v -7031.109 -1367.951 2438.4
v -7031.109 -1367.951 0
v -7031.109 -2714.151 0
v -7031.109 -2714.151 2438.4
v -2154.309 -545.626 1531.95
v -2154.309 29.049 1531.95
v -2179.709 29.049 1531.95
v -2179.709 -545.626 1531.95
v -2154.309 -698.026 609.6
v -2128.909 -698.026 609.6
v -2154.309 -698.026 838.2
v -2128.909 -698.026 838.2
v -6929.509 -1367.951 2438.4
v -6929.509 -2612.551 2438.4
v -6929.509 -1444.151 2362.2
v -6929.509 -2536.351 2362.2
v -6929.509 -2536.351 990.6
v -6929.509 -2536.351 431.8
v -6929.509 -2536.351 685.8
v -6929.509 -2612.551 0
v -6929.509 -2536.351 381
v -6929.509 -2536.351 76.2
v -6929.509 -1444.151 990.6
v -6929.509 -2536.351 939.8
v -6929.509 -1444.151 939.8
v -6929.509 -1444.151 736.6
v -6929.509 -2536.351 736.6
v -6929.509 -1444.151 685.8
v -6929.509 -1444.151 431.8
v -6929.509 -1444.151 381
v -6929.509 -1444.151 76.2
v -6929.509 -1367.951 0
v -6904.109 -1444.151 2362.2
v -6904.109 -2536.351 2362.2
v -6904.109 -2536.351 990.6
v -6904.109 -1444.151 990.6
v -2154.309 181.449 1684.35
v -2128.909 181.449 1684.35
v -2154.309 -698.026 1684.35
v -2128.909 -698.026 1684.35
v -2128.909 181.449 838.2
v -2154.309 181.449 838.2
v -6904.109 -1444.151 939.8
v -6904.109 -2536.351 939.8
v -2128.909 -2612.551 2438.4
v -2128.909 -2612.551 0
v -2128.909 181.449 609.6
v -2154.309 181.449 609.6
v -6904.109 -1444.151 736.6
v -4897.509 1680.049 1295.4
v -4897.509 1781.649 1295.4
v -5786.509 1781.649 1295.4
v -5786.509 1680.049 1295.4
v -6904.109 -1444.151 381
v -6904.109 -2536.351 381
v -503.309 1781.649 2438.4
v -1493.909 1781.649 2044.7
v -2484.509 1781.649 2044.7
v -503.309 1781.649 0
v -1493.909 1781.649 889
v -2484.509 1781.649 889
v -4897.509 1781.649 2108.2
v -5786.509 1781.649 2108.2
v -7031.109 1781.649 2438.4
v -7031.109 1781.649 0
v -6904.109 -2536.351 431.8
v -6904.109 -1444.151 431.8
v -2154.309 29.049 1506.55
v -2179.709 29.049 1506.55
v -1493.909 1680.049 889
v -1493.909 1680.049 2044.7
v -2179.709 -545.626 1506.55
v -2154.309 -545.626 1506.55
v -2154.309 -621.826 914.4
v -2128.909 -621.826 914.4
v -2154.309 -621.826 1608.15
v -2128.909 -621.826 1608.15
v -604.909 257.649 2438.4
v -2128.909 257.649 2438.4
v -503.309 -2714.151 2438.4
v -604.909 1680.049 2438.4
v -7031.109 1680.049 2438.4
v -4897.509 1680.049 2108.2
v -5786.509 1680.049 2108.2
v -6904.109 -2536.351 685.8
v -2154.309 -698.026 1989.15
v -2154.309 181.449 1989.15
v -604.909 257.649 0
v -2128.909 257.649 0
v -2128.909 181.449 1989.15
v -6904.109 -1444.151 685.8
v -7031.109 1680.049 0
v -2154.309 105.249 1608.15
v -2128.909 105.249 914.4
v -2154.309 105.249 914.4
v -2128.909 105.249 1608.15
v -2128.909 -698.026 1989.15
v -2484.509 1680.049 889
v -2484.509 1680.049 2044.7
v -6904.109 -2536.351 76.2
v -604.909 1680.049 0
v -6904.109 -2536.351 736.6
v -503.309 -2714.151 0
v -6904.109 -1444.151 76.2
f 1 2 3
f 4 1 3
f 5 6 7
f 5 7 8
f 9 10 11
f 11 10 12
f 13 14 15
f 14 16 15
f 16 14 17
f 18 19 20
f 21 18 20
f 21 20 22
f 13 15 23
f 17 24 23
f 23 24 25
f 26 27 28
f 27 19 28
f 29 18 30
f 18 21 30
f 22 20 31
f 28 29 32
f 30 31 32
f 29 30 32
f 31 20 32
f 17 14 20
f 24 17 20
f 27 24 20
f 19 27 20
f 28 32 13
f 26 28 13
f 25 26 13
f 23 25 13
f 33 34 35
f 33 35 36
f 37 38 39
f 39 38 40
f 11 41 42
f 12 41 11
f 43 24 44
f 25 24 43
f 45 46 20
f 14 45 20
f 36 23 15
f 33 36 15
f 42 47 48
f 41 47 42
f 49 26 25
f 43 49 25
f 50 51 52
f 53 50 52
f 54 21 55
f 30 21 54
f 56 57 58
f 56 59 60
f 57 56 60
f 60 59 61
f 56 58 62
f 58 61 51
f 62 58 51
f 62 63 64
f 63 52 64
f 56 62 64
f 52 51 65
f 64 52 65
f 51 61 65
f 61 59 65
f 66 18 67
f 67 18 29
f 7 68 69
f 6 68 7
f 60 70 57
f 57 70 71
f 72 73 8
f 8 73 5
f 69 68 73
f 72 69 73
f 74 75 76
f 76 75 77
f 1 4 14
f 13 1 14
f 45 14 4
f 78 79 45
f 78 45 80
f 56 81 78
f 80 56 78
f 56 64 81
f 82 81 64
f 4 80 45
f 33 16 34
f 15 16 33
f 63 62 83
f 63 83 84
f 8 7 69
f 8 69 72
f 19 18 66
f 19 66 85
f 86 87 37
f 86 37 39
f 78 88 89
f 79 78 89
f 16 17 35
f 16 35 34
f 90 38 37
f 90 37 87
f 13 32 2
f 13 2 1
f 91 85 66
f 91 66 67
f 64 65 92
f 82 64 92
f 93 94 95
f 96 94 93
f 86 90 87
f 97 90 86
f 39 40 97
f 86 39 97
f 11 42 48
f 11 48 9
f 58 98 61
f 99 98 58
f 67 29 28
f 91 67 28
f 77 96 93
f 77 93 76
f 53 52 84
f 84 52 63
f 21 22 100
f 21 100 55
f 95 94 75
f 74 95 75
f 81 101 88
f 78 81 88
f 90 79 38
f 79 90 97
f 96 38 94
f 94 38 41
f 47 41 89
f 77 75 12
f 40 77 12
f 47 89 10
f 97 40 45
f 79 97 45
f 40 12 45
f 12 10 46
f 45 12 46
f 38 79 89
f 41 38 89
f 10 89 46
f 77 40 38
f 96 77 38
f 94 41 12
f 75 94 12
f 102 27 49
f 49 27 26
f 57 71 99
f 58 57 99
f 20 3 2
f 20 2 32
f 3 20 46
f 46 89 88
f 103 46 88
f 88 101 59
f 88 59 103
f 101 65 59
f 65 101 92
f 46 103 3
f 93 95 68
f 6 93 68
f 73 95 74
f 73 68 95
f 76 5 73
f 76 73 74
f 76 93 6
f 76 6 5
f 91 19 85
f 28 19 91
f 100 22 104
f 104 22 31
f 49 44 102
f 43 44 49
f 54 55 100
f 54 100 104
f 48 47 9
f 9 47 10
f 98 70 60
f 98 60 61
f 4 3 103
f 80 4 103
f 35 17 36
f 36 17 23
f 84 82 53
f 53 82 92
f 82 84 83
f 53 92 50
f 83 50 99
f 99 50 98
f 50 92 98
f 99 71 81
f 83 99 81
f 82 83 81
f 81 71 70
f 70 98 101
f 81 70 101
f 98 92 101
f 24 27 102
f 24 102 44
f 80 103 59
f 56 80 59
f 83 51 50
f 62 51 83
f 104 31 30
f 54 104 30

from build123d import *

# Parameters (mm, degrees)
F1_DEPTH  = 2438.4
F2_W      = 990.6
F2_H      = 1155.7
F2_W_2    = 889
F2_H_2    = 812.8
F3_DEPTH  = 127
F4_W      = 3048
F4_H      = 2438.4
F5_DEPTH  = 101.6
F6_W      = 727.075
F6_H      = 693.7502
F7_DEPTH  = 25.4
F8_W      = 574.675
F8_H      = 25.4
F9_DEPTH  = 25.4
F10_W     = 879.475
F10_H     = 304.8
F10_H_2   = 228.6
F11_DEPTH = 25.4
F12_W     = 1092.2
F12_H     = 304.8
F12_H_2   = 254
F12_H_3   = 203.2
F12_H_4   = 1371.6
F13_DEPTH = 25.4


with BuildPart() as f1:
    # F0 (on Top) → F1 (new body)
    with BuildSketch(Plane.XY):
        Polygon((-503.308974, 1781.648856), (-7031.108974, 1781.648856), (-7031.108974, -1063.151144), (-7031.108974, -2714.151144), (-503.308974, -2714.151144), align=None)
        Polygon((-604.908974, 1680.048856), (-604.908974, 257.648856), (-2128.908974, 257.648856), (-2128.908974, -2612.551144), (-6929.508974, -2612.551144), (-6929.508974, 1680.048856), align=None, mode=Mode.SUBTRACT)
    extrude(amount=F1_DEPTH)

    # F2 (on face) → F3 (cut, symmetric)
    with BuildSketch(Plane(origin=(0, 1781.648856, 0), x_dir=(-1, 0, 0), z_dir=(0, 1, 0))):
        with Locations((1989.208974, 1466.85)):
            Rectangle(F2_W, F2_H)
        with Locations((5342.008974, 1701.8)):
            Rectangle(F2_W_2, F2_H_2)
    extrude(amount=F3_DEPTH, both=True, mode=Mode.SUBTRACT)

    # F4 (on face) → F5 (cut, through all)
    with BuildSketch(Plane.YZ.offset(-6929.508974)):
        with Locations((156.048856, 1219.2)):
            Rectangle(F4_W, F4_H)
    extrude(amount=-F5_DEPTH, mode=Mode.SUBTRACT)

    # F6 (on face) → F7 (join)
    with BuildSketch(Plane(origin=(-2128.908974, 0, 0), x_dir=(0, -1, 0), z_dir=(-1, 0, 0))):
        with Locations((258.288644, 1261.2751)):
            Rectangle(F6_W, F6_H)
    extrude(amount=F7_DEPTH)

    # F8 (on face) → F9 (join)
    with BuildSketch(Plane(origin=(-2154.308974, 0, 0), x_dir=(0, -1, 0), z_dir=(-1, 0, 0))):
        with Locations((258.288644, 1519.2502)):
            Rectangle(F8_W, F8_H)
    extrude(amount=F9_DEPTH)

    # F10 (on face) → F11 (join)
    with BuildSketch(Plane(origin=(-2128.908974, 0, 0), x_dir=(0, -1, 0), z_dir=(-1, 0, 0))):
        with Locations((258.288644, 1836.7502)):
            Rectangle(F10_W, F10_H)
        with Locations((258.288644, 723.9)):
            Rectangle(F10_W, F10_H_2)
    extrude(amount=F11_DEPTH)

    # F12 (on face) → F13 (join)
    with BuildSketch(Plane.YZ.offset(-6929.508974)):
        with Locations((-1990.251144, 228.6)):
            Rectangle(F12_W, F12_H)
        with Locations((-1990.251144, 558.8)):
            Rectangle(F12_W, F12_H_2)
        with Locations((-1990.251144, 838.2)):
            Rectangle(F12_W, F12_H_3)
        with Locations((-1990.251144, 1676.4)):
            Rectangle(F12_W, F12_H_4)
    extrude(amount=F13_DEPTH)


solid = f1.part
